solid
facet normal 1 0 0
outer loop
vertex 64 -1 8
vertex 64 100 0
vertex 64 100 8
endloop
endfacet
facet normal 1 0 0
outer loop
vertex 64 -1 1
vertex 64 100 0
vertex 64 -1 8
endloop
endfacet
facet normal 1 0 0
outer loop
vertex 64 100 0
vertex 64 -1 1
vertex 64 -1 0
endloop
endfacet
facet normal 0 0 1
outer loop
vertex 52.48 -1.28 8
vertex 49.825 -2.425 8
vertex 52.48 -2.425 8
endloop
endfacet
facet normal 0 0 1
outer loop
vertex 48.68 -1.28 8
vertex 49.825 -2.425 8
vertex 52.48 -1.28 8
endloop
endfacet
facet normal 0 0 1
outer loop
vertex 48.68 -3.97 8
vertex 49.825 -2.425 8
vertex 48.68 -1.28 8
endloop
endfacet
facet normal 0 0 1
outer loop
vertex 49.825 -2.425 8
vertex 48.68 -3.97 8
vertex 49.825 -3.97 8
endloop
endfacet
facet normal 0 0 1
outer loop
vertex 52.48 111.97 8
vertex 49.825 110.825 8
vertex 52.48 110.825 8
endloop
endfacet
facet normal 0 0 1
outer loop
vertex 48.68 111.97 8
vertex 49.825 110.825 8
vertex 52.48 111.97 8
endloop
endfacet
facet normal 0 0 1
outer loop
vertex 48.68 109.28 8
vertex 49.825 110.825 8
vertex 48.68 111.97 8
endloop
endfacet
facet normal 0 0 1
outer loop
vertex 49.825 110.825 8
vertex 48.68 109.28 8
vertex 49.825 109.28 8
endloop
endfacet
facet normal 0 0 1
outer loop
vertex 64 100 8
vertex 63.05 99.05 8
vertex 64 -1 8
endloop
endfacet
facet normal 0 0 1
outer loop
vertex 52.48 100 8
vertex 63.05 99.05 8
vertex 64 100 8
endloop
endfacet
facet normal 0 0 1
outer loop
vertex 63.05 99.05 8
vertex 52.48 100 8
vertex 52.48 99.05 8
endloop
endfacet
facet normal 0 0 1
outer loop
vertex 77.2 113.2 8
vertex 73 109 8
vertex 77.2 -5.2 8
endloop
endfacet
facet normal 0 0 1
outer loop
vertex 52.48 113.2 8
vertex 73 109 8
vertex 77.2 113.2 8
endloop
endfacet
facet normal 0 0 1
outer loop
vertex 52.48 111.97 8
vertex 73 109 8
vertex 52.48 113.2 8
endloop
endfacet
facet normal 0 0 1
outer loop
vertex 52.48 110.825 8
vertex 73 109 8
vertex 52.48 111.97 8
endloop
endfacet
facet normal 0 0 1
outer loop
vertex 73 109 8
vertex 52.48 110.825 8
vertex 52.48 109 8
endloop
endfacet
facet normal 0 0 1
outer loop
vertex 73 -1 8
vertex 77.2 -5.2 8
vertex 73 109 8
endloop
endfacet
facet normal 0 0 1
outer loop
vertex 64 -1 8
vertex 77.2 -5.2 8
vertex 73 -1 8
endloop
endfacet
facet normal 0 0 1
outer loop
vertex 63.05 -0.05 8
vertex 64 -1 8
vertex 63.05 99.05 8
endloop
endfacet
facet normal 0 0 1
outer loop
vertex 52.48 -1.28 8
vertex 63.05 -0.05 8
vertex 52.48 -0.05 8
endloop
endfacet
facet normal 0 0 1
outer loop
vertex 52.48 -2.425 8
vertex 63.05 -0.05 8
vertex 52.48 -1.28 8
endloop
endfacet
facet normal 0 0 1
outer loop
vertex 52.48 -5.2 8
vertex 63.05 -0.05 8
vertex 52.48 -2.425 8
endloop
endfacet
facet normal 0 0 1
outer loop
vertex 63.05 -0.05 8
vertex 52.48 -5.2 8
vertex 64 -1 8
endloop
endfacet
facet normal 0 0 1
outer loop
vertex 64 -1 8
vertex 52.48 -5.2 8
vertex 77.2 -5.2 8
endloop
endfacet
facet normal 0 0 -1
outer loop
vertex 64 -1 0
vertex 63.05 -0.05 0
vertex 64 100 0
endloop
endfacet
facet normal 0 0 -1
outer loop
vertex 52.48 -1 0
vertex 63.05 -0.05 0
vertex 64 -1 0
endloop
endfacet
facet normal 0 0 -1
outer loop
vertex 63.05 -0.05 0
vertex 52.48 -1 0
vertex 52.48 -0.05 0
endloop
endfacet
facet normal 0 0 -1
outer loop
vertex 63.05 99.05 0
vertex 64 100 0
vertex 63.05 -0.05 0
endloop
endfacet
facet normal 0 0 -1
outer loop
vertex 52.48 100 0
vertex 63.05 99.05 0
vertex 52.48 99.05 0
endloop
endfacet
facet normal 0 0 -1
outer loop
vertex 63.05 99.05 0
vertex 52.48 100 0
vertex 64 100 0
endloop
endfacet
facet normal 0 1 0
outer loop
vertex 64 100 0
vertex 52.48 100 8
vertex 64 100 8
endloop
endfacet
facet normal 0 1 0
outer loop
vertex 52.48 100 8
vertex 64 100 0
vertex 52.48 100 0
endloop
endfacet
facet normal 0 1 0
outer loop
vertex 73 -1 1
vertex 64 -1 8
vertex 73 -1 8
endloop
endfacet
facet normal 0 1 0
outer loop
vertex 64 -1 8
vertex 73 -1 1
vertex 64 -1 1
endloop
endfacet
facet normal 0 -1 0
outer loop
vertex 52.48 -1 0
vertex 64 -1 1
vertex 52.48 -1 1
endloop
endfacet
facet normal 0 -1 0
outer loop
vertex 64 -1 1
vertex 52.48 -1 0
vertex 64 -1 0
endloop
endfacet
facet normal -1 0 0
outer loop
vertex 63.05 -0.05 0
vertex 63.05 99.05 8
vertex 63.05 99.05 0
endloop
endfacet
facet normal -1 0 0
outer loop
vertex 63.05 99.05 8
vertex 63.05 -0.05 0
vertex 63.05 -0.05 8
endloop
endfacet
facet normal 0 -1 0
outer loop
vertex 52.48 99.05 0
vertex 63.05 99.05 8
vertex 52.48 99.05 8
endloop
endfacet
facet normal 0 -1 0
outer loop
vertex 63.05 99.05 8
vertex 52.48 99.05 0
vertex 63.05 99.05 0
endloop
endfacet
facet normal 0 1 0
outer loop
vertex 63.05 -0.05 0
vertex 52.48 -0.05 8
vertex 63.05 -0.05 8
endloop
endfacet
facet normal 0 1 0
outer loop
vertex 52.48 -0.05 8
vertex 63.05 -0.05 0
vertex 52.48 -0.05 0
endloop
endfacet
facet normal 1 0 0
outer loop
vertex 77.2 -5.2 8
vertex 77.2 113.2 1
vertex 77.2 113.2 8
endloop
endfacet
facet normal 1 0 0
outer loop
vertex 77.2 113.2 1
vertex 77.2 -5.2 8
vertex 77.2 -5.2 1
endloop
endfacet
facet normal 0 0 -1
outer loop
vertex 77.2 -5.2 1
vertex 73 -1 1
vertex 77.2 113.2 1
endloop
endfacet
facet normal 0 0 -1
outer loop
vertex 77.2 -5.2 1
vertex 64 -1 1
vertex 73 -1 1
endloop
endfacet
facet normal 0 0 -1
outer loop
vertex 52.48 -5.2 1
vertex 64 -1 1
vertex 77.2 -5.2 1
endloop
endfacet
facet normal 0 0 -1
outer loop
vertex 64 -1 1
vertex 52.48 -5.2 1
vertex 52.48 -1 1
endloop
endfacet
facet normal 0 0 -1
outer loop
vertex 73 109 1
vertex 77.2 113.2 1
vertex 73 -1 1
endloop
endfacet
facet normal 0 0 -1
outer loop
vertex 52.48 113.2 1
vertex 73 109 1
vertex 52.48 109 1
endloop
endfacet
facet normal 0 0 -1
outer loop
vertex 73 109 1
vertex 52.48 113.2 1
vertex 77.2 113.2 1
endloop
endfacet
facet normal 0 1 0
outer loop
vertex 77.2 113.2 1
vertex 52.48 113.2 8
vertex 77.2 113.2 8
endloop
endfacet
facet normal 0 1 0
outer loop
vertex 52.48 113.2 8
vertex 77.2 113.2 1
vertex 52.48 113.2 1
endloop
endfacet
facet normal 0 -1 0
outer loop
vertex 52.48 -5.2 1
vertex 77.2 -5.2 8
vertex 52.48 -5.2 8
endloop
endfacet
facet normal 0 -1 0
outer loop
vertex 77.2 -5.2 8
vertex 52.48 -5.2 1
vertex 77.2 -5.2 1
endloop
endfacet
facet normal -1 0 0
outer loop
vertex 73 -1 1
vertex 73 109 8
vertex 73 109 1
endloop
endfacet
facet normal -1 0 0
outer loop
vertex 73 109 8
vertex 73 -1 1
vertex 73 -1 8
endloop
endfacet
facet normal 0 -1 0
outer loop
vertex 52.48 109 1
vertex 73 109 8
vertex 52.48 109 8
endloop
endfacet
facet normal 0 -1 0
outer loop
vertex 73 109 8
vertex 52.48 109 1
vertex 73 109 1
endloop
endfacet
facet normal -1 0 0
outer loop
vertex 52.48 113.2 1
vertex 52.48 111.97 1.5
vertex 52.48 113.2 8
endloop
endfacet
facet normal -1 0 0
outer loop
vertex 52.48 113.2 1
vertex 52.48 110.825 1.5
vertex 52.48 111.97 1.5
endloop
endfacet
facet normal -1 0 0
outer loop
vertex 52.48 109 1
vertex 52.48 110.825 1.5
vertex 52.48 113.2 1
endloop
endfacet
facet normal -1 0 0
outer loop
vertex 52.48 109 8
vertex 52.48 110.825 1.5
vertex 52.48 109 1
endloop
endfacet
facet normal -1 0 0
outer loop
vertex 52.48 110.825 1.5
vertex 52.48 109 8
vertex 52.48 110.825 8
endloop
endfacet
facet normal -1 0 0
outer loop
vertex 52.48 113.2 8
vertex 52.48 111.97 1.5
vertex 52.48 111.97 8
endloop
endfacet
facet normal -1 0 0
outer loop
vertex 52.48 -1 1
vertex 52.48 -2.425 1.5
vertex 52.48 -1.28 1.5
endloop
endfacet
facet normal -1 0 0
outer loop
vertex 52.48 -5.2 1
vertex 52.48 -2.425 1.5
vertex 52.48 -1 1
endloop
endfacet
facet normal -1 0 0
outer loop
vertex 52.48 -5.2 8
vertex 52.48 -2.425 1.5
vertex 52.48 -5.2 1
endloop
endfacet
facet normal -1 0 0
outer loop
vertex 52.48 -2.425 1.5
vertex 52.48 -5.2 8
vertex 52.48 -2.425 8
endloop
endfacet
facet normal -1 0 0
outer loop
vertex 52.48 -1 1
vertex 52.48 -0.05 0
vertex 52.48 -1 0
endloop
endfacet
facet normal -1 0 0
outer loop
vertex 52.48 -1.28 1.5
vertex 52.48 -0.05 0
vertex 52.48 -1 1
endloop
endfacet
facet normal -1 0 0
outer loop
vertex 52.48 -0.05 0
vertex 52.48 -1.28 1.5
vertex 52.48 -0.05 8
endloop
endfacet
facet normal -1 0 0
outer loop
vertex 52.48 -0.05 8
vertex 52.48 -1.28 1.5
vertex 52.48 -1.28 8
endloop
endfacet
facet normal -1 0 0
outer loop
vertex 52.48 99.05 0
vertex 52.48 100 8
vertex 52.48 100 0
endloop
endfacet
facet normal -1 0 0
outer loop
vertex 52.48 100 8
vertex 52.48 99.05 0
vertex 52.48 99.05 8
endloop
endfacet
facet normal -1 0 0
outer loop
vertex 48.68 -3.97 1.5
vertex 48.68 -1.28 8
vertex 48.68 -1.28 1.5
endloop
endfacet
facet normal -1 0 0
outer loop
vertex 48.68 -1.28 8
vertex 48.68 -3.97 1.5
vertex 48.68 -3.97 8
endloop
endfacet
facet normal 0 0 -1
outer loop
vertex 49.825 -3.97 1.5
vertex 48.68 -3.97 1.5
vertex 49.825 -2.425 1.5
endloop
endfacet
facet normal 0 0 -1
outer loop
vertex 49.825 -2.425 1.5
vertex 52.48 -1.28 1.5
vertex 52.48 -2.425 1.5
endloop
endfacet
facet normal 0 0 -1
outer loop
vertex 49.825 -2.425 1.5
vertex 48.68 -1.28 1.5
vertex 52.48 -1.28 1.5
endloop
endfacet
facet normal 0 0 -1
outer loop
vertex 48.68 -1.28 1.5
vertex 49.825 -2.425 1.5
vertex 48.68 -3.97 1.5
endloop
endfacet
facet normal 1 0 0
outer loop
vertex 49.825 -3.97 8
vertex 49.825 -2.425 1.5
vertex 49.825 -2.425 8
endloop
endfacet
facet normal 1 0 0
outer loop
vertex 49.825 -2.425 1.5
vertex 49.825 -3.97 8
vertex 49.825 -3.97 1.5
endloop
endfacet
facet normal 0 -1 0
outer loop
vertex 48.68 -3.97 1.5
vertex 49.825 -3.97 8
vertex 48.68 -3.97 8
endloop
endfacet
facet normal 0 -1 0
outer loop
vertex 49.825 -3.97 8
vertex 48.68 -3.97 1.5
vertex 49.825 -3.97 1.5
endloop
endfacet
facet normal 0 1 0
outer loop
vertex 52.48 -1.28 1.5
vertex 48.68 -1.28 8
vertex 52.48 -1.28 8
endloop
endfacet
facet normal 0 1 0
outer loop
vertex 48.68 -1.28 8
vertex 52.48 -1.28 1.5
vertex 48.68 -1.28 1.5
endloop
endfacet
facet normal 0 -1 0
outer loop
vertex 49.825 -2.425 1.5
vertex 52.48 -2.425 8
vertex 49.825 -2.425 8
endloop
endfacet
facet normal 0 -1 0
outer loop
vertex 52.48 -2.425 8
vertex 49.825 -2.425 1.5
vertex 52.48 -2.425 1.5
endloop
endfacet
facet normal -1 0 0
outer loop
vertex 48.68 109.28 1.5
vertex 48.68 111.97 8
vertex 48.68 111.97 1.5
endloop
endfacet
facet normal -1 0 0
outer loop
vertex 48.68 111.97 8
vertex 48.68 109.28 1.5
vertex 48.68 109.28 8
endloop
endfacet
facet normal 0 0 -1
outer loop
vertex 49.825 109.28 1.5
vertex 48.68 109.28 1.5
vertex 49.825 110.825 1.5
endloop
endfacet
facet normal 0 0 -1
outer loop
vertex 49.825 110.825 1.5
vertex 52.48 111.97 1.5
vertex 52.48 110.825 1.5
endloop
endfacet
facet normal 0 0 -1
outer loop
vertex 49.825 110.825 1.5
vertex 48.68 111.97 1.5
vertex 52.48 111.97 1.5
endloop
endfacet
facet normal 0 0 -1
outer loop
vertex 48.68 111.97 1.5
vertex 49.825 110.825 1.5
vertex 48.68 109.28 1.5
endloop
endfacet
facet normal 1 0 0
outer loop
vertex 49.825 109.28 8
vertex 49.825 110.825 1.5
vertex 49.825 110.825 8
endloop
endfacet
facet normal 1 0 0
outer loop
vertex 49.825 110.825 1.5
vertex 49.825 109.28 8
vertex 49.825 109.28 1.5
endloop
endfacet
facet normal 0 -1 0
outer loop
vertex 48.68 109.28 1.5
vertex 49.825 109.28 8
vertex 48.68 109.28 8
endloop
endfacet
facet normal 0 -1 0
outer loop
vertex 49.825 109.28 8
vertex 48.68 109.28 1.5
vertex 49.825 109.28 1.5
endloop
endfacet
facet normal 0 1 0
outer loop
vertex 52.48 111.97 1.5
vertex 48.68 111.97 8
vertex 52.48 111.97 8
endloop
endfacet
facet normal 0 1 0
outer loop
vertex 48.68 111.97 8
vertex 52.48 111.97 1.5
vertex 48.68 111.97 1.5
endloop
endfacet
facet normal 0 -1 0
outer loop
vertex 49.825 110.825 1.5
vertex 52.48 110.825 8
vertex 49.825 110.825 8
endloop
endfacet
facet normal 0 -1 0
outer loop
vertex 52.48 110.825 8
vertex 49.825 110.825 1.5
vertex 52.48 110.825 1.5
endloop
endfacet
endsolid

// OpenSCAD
// Generated by SolidPython 1.0.4 on 2021-07-12 16:55:47


union() {
	union() {
		difference() {
			union() {
				difference() {
					translate(v = [-1.0000000000, -1.0000000000, 0]) {
						cube(size = [65.0000000000, 101.0000000000, 8]);
					}
					translate(v = [-0.0500000000, -0.0500000000, 0]) {
						cube(size = [63.1000000000, 99.1000000000, 8]);
					}
				}
				translate(v = [0, 0, 1]) {
					difference() {
						translate(v = [-5.2000000000, -5.2000000000, 0]) {
							cube(size = [82.4000000000, 118.4000000000, 7]);
						}
						translate(v = [-1.0000000000, -1.0000000000, 0]) {
							cube(size = [74.0000000000, 110.0000000000, 7]);
						}
					}
				}
			}
			translate(v = [-5.2000000000, -5.2000000000, 0]) {
				cube(size = [57.6800000000, 118.4000000000, 8]);
			}
		}
		translate(v = [48.4800000000, -4.1700000000, 0]) {
			translate(v = [0.2000000000, 0.2000000000, 0]) {
				translate(v = [0, 0, 1.5000000000]) {
					translate(v = [3.8000000000, 2.6900000000, 0]) {
						rotate(a = -180) {
							union() {
								translate(v = [2.6550000000, 0, 0]) {
									cube(size = [1.1450000000, 2.6900000000, 6.5000000000]);
								}
								cube(size = [3.8000000000, 1.1450000000, 6.5000000000]);
							}
						}
					}
				}
			}
		}
	}
	translate(v = [48.4800000000, 109.0800000000, 0]) {
		translate(v = [0.2000000000, 0.2000000000, 0]) {
			translate(v = [0, 0, 1.5000000000]) {
				translate(v = [3.8000000000, 2.6900000000, 0]) {
					rotate(a = -180) {
						union() {
							translate(v = [2.6550000000, 0, 0]) {
								cube(size = [1.1450000000, 2.6900000000, 6.5000000000]);
							}
							cube(size = [3.8000000000, 1.1450000000, 6.5000000000]);
						}
					}
				}
			}
		}
	}
}
